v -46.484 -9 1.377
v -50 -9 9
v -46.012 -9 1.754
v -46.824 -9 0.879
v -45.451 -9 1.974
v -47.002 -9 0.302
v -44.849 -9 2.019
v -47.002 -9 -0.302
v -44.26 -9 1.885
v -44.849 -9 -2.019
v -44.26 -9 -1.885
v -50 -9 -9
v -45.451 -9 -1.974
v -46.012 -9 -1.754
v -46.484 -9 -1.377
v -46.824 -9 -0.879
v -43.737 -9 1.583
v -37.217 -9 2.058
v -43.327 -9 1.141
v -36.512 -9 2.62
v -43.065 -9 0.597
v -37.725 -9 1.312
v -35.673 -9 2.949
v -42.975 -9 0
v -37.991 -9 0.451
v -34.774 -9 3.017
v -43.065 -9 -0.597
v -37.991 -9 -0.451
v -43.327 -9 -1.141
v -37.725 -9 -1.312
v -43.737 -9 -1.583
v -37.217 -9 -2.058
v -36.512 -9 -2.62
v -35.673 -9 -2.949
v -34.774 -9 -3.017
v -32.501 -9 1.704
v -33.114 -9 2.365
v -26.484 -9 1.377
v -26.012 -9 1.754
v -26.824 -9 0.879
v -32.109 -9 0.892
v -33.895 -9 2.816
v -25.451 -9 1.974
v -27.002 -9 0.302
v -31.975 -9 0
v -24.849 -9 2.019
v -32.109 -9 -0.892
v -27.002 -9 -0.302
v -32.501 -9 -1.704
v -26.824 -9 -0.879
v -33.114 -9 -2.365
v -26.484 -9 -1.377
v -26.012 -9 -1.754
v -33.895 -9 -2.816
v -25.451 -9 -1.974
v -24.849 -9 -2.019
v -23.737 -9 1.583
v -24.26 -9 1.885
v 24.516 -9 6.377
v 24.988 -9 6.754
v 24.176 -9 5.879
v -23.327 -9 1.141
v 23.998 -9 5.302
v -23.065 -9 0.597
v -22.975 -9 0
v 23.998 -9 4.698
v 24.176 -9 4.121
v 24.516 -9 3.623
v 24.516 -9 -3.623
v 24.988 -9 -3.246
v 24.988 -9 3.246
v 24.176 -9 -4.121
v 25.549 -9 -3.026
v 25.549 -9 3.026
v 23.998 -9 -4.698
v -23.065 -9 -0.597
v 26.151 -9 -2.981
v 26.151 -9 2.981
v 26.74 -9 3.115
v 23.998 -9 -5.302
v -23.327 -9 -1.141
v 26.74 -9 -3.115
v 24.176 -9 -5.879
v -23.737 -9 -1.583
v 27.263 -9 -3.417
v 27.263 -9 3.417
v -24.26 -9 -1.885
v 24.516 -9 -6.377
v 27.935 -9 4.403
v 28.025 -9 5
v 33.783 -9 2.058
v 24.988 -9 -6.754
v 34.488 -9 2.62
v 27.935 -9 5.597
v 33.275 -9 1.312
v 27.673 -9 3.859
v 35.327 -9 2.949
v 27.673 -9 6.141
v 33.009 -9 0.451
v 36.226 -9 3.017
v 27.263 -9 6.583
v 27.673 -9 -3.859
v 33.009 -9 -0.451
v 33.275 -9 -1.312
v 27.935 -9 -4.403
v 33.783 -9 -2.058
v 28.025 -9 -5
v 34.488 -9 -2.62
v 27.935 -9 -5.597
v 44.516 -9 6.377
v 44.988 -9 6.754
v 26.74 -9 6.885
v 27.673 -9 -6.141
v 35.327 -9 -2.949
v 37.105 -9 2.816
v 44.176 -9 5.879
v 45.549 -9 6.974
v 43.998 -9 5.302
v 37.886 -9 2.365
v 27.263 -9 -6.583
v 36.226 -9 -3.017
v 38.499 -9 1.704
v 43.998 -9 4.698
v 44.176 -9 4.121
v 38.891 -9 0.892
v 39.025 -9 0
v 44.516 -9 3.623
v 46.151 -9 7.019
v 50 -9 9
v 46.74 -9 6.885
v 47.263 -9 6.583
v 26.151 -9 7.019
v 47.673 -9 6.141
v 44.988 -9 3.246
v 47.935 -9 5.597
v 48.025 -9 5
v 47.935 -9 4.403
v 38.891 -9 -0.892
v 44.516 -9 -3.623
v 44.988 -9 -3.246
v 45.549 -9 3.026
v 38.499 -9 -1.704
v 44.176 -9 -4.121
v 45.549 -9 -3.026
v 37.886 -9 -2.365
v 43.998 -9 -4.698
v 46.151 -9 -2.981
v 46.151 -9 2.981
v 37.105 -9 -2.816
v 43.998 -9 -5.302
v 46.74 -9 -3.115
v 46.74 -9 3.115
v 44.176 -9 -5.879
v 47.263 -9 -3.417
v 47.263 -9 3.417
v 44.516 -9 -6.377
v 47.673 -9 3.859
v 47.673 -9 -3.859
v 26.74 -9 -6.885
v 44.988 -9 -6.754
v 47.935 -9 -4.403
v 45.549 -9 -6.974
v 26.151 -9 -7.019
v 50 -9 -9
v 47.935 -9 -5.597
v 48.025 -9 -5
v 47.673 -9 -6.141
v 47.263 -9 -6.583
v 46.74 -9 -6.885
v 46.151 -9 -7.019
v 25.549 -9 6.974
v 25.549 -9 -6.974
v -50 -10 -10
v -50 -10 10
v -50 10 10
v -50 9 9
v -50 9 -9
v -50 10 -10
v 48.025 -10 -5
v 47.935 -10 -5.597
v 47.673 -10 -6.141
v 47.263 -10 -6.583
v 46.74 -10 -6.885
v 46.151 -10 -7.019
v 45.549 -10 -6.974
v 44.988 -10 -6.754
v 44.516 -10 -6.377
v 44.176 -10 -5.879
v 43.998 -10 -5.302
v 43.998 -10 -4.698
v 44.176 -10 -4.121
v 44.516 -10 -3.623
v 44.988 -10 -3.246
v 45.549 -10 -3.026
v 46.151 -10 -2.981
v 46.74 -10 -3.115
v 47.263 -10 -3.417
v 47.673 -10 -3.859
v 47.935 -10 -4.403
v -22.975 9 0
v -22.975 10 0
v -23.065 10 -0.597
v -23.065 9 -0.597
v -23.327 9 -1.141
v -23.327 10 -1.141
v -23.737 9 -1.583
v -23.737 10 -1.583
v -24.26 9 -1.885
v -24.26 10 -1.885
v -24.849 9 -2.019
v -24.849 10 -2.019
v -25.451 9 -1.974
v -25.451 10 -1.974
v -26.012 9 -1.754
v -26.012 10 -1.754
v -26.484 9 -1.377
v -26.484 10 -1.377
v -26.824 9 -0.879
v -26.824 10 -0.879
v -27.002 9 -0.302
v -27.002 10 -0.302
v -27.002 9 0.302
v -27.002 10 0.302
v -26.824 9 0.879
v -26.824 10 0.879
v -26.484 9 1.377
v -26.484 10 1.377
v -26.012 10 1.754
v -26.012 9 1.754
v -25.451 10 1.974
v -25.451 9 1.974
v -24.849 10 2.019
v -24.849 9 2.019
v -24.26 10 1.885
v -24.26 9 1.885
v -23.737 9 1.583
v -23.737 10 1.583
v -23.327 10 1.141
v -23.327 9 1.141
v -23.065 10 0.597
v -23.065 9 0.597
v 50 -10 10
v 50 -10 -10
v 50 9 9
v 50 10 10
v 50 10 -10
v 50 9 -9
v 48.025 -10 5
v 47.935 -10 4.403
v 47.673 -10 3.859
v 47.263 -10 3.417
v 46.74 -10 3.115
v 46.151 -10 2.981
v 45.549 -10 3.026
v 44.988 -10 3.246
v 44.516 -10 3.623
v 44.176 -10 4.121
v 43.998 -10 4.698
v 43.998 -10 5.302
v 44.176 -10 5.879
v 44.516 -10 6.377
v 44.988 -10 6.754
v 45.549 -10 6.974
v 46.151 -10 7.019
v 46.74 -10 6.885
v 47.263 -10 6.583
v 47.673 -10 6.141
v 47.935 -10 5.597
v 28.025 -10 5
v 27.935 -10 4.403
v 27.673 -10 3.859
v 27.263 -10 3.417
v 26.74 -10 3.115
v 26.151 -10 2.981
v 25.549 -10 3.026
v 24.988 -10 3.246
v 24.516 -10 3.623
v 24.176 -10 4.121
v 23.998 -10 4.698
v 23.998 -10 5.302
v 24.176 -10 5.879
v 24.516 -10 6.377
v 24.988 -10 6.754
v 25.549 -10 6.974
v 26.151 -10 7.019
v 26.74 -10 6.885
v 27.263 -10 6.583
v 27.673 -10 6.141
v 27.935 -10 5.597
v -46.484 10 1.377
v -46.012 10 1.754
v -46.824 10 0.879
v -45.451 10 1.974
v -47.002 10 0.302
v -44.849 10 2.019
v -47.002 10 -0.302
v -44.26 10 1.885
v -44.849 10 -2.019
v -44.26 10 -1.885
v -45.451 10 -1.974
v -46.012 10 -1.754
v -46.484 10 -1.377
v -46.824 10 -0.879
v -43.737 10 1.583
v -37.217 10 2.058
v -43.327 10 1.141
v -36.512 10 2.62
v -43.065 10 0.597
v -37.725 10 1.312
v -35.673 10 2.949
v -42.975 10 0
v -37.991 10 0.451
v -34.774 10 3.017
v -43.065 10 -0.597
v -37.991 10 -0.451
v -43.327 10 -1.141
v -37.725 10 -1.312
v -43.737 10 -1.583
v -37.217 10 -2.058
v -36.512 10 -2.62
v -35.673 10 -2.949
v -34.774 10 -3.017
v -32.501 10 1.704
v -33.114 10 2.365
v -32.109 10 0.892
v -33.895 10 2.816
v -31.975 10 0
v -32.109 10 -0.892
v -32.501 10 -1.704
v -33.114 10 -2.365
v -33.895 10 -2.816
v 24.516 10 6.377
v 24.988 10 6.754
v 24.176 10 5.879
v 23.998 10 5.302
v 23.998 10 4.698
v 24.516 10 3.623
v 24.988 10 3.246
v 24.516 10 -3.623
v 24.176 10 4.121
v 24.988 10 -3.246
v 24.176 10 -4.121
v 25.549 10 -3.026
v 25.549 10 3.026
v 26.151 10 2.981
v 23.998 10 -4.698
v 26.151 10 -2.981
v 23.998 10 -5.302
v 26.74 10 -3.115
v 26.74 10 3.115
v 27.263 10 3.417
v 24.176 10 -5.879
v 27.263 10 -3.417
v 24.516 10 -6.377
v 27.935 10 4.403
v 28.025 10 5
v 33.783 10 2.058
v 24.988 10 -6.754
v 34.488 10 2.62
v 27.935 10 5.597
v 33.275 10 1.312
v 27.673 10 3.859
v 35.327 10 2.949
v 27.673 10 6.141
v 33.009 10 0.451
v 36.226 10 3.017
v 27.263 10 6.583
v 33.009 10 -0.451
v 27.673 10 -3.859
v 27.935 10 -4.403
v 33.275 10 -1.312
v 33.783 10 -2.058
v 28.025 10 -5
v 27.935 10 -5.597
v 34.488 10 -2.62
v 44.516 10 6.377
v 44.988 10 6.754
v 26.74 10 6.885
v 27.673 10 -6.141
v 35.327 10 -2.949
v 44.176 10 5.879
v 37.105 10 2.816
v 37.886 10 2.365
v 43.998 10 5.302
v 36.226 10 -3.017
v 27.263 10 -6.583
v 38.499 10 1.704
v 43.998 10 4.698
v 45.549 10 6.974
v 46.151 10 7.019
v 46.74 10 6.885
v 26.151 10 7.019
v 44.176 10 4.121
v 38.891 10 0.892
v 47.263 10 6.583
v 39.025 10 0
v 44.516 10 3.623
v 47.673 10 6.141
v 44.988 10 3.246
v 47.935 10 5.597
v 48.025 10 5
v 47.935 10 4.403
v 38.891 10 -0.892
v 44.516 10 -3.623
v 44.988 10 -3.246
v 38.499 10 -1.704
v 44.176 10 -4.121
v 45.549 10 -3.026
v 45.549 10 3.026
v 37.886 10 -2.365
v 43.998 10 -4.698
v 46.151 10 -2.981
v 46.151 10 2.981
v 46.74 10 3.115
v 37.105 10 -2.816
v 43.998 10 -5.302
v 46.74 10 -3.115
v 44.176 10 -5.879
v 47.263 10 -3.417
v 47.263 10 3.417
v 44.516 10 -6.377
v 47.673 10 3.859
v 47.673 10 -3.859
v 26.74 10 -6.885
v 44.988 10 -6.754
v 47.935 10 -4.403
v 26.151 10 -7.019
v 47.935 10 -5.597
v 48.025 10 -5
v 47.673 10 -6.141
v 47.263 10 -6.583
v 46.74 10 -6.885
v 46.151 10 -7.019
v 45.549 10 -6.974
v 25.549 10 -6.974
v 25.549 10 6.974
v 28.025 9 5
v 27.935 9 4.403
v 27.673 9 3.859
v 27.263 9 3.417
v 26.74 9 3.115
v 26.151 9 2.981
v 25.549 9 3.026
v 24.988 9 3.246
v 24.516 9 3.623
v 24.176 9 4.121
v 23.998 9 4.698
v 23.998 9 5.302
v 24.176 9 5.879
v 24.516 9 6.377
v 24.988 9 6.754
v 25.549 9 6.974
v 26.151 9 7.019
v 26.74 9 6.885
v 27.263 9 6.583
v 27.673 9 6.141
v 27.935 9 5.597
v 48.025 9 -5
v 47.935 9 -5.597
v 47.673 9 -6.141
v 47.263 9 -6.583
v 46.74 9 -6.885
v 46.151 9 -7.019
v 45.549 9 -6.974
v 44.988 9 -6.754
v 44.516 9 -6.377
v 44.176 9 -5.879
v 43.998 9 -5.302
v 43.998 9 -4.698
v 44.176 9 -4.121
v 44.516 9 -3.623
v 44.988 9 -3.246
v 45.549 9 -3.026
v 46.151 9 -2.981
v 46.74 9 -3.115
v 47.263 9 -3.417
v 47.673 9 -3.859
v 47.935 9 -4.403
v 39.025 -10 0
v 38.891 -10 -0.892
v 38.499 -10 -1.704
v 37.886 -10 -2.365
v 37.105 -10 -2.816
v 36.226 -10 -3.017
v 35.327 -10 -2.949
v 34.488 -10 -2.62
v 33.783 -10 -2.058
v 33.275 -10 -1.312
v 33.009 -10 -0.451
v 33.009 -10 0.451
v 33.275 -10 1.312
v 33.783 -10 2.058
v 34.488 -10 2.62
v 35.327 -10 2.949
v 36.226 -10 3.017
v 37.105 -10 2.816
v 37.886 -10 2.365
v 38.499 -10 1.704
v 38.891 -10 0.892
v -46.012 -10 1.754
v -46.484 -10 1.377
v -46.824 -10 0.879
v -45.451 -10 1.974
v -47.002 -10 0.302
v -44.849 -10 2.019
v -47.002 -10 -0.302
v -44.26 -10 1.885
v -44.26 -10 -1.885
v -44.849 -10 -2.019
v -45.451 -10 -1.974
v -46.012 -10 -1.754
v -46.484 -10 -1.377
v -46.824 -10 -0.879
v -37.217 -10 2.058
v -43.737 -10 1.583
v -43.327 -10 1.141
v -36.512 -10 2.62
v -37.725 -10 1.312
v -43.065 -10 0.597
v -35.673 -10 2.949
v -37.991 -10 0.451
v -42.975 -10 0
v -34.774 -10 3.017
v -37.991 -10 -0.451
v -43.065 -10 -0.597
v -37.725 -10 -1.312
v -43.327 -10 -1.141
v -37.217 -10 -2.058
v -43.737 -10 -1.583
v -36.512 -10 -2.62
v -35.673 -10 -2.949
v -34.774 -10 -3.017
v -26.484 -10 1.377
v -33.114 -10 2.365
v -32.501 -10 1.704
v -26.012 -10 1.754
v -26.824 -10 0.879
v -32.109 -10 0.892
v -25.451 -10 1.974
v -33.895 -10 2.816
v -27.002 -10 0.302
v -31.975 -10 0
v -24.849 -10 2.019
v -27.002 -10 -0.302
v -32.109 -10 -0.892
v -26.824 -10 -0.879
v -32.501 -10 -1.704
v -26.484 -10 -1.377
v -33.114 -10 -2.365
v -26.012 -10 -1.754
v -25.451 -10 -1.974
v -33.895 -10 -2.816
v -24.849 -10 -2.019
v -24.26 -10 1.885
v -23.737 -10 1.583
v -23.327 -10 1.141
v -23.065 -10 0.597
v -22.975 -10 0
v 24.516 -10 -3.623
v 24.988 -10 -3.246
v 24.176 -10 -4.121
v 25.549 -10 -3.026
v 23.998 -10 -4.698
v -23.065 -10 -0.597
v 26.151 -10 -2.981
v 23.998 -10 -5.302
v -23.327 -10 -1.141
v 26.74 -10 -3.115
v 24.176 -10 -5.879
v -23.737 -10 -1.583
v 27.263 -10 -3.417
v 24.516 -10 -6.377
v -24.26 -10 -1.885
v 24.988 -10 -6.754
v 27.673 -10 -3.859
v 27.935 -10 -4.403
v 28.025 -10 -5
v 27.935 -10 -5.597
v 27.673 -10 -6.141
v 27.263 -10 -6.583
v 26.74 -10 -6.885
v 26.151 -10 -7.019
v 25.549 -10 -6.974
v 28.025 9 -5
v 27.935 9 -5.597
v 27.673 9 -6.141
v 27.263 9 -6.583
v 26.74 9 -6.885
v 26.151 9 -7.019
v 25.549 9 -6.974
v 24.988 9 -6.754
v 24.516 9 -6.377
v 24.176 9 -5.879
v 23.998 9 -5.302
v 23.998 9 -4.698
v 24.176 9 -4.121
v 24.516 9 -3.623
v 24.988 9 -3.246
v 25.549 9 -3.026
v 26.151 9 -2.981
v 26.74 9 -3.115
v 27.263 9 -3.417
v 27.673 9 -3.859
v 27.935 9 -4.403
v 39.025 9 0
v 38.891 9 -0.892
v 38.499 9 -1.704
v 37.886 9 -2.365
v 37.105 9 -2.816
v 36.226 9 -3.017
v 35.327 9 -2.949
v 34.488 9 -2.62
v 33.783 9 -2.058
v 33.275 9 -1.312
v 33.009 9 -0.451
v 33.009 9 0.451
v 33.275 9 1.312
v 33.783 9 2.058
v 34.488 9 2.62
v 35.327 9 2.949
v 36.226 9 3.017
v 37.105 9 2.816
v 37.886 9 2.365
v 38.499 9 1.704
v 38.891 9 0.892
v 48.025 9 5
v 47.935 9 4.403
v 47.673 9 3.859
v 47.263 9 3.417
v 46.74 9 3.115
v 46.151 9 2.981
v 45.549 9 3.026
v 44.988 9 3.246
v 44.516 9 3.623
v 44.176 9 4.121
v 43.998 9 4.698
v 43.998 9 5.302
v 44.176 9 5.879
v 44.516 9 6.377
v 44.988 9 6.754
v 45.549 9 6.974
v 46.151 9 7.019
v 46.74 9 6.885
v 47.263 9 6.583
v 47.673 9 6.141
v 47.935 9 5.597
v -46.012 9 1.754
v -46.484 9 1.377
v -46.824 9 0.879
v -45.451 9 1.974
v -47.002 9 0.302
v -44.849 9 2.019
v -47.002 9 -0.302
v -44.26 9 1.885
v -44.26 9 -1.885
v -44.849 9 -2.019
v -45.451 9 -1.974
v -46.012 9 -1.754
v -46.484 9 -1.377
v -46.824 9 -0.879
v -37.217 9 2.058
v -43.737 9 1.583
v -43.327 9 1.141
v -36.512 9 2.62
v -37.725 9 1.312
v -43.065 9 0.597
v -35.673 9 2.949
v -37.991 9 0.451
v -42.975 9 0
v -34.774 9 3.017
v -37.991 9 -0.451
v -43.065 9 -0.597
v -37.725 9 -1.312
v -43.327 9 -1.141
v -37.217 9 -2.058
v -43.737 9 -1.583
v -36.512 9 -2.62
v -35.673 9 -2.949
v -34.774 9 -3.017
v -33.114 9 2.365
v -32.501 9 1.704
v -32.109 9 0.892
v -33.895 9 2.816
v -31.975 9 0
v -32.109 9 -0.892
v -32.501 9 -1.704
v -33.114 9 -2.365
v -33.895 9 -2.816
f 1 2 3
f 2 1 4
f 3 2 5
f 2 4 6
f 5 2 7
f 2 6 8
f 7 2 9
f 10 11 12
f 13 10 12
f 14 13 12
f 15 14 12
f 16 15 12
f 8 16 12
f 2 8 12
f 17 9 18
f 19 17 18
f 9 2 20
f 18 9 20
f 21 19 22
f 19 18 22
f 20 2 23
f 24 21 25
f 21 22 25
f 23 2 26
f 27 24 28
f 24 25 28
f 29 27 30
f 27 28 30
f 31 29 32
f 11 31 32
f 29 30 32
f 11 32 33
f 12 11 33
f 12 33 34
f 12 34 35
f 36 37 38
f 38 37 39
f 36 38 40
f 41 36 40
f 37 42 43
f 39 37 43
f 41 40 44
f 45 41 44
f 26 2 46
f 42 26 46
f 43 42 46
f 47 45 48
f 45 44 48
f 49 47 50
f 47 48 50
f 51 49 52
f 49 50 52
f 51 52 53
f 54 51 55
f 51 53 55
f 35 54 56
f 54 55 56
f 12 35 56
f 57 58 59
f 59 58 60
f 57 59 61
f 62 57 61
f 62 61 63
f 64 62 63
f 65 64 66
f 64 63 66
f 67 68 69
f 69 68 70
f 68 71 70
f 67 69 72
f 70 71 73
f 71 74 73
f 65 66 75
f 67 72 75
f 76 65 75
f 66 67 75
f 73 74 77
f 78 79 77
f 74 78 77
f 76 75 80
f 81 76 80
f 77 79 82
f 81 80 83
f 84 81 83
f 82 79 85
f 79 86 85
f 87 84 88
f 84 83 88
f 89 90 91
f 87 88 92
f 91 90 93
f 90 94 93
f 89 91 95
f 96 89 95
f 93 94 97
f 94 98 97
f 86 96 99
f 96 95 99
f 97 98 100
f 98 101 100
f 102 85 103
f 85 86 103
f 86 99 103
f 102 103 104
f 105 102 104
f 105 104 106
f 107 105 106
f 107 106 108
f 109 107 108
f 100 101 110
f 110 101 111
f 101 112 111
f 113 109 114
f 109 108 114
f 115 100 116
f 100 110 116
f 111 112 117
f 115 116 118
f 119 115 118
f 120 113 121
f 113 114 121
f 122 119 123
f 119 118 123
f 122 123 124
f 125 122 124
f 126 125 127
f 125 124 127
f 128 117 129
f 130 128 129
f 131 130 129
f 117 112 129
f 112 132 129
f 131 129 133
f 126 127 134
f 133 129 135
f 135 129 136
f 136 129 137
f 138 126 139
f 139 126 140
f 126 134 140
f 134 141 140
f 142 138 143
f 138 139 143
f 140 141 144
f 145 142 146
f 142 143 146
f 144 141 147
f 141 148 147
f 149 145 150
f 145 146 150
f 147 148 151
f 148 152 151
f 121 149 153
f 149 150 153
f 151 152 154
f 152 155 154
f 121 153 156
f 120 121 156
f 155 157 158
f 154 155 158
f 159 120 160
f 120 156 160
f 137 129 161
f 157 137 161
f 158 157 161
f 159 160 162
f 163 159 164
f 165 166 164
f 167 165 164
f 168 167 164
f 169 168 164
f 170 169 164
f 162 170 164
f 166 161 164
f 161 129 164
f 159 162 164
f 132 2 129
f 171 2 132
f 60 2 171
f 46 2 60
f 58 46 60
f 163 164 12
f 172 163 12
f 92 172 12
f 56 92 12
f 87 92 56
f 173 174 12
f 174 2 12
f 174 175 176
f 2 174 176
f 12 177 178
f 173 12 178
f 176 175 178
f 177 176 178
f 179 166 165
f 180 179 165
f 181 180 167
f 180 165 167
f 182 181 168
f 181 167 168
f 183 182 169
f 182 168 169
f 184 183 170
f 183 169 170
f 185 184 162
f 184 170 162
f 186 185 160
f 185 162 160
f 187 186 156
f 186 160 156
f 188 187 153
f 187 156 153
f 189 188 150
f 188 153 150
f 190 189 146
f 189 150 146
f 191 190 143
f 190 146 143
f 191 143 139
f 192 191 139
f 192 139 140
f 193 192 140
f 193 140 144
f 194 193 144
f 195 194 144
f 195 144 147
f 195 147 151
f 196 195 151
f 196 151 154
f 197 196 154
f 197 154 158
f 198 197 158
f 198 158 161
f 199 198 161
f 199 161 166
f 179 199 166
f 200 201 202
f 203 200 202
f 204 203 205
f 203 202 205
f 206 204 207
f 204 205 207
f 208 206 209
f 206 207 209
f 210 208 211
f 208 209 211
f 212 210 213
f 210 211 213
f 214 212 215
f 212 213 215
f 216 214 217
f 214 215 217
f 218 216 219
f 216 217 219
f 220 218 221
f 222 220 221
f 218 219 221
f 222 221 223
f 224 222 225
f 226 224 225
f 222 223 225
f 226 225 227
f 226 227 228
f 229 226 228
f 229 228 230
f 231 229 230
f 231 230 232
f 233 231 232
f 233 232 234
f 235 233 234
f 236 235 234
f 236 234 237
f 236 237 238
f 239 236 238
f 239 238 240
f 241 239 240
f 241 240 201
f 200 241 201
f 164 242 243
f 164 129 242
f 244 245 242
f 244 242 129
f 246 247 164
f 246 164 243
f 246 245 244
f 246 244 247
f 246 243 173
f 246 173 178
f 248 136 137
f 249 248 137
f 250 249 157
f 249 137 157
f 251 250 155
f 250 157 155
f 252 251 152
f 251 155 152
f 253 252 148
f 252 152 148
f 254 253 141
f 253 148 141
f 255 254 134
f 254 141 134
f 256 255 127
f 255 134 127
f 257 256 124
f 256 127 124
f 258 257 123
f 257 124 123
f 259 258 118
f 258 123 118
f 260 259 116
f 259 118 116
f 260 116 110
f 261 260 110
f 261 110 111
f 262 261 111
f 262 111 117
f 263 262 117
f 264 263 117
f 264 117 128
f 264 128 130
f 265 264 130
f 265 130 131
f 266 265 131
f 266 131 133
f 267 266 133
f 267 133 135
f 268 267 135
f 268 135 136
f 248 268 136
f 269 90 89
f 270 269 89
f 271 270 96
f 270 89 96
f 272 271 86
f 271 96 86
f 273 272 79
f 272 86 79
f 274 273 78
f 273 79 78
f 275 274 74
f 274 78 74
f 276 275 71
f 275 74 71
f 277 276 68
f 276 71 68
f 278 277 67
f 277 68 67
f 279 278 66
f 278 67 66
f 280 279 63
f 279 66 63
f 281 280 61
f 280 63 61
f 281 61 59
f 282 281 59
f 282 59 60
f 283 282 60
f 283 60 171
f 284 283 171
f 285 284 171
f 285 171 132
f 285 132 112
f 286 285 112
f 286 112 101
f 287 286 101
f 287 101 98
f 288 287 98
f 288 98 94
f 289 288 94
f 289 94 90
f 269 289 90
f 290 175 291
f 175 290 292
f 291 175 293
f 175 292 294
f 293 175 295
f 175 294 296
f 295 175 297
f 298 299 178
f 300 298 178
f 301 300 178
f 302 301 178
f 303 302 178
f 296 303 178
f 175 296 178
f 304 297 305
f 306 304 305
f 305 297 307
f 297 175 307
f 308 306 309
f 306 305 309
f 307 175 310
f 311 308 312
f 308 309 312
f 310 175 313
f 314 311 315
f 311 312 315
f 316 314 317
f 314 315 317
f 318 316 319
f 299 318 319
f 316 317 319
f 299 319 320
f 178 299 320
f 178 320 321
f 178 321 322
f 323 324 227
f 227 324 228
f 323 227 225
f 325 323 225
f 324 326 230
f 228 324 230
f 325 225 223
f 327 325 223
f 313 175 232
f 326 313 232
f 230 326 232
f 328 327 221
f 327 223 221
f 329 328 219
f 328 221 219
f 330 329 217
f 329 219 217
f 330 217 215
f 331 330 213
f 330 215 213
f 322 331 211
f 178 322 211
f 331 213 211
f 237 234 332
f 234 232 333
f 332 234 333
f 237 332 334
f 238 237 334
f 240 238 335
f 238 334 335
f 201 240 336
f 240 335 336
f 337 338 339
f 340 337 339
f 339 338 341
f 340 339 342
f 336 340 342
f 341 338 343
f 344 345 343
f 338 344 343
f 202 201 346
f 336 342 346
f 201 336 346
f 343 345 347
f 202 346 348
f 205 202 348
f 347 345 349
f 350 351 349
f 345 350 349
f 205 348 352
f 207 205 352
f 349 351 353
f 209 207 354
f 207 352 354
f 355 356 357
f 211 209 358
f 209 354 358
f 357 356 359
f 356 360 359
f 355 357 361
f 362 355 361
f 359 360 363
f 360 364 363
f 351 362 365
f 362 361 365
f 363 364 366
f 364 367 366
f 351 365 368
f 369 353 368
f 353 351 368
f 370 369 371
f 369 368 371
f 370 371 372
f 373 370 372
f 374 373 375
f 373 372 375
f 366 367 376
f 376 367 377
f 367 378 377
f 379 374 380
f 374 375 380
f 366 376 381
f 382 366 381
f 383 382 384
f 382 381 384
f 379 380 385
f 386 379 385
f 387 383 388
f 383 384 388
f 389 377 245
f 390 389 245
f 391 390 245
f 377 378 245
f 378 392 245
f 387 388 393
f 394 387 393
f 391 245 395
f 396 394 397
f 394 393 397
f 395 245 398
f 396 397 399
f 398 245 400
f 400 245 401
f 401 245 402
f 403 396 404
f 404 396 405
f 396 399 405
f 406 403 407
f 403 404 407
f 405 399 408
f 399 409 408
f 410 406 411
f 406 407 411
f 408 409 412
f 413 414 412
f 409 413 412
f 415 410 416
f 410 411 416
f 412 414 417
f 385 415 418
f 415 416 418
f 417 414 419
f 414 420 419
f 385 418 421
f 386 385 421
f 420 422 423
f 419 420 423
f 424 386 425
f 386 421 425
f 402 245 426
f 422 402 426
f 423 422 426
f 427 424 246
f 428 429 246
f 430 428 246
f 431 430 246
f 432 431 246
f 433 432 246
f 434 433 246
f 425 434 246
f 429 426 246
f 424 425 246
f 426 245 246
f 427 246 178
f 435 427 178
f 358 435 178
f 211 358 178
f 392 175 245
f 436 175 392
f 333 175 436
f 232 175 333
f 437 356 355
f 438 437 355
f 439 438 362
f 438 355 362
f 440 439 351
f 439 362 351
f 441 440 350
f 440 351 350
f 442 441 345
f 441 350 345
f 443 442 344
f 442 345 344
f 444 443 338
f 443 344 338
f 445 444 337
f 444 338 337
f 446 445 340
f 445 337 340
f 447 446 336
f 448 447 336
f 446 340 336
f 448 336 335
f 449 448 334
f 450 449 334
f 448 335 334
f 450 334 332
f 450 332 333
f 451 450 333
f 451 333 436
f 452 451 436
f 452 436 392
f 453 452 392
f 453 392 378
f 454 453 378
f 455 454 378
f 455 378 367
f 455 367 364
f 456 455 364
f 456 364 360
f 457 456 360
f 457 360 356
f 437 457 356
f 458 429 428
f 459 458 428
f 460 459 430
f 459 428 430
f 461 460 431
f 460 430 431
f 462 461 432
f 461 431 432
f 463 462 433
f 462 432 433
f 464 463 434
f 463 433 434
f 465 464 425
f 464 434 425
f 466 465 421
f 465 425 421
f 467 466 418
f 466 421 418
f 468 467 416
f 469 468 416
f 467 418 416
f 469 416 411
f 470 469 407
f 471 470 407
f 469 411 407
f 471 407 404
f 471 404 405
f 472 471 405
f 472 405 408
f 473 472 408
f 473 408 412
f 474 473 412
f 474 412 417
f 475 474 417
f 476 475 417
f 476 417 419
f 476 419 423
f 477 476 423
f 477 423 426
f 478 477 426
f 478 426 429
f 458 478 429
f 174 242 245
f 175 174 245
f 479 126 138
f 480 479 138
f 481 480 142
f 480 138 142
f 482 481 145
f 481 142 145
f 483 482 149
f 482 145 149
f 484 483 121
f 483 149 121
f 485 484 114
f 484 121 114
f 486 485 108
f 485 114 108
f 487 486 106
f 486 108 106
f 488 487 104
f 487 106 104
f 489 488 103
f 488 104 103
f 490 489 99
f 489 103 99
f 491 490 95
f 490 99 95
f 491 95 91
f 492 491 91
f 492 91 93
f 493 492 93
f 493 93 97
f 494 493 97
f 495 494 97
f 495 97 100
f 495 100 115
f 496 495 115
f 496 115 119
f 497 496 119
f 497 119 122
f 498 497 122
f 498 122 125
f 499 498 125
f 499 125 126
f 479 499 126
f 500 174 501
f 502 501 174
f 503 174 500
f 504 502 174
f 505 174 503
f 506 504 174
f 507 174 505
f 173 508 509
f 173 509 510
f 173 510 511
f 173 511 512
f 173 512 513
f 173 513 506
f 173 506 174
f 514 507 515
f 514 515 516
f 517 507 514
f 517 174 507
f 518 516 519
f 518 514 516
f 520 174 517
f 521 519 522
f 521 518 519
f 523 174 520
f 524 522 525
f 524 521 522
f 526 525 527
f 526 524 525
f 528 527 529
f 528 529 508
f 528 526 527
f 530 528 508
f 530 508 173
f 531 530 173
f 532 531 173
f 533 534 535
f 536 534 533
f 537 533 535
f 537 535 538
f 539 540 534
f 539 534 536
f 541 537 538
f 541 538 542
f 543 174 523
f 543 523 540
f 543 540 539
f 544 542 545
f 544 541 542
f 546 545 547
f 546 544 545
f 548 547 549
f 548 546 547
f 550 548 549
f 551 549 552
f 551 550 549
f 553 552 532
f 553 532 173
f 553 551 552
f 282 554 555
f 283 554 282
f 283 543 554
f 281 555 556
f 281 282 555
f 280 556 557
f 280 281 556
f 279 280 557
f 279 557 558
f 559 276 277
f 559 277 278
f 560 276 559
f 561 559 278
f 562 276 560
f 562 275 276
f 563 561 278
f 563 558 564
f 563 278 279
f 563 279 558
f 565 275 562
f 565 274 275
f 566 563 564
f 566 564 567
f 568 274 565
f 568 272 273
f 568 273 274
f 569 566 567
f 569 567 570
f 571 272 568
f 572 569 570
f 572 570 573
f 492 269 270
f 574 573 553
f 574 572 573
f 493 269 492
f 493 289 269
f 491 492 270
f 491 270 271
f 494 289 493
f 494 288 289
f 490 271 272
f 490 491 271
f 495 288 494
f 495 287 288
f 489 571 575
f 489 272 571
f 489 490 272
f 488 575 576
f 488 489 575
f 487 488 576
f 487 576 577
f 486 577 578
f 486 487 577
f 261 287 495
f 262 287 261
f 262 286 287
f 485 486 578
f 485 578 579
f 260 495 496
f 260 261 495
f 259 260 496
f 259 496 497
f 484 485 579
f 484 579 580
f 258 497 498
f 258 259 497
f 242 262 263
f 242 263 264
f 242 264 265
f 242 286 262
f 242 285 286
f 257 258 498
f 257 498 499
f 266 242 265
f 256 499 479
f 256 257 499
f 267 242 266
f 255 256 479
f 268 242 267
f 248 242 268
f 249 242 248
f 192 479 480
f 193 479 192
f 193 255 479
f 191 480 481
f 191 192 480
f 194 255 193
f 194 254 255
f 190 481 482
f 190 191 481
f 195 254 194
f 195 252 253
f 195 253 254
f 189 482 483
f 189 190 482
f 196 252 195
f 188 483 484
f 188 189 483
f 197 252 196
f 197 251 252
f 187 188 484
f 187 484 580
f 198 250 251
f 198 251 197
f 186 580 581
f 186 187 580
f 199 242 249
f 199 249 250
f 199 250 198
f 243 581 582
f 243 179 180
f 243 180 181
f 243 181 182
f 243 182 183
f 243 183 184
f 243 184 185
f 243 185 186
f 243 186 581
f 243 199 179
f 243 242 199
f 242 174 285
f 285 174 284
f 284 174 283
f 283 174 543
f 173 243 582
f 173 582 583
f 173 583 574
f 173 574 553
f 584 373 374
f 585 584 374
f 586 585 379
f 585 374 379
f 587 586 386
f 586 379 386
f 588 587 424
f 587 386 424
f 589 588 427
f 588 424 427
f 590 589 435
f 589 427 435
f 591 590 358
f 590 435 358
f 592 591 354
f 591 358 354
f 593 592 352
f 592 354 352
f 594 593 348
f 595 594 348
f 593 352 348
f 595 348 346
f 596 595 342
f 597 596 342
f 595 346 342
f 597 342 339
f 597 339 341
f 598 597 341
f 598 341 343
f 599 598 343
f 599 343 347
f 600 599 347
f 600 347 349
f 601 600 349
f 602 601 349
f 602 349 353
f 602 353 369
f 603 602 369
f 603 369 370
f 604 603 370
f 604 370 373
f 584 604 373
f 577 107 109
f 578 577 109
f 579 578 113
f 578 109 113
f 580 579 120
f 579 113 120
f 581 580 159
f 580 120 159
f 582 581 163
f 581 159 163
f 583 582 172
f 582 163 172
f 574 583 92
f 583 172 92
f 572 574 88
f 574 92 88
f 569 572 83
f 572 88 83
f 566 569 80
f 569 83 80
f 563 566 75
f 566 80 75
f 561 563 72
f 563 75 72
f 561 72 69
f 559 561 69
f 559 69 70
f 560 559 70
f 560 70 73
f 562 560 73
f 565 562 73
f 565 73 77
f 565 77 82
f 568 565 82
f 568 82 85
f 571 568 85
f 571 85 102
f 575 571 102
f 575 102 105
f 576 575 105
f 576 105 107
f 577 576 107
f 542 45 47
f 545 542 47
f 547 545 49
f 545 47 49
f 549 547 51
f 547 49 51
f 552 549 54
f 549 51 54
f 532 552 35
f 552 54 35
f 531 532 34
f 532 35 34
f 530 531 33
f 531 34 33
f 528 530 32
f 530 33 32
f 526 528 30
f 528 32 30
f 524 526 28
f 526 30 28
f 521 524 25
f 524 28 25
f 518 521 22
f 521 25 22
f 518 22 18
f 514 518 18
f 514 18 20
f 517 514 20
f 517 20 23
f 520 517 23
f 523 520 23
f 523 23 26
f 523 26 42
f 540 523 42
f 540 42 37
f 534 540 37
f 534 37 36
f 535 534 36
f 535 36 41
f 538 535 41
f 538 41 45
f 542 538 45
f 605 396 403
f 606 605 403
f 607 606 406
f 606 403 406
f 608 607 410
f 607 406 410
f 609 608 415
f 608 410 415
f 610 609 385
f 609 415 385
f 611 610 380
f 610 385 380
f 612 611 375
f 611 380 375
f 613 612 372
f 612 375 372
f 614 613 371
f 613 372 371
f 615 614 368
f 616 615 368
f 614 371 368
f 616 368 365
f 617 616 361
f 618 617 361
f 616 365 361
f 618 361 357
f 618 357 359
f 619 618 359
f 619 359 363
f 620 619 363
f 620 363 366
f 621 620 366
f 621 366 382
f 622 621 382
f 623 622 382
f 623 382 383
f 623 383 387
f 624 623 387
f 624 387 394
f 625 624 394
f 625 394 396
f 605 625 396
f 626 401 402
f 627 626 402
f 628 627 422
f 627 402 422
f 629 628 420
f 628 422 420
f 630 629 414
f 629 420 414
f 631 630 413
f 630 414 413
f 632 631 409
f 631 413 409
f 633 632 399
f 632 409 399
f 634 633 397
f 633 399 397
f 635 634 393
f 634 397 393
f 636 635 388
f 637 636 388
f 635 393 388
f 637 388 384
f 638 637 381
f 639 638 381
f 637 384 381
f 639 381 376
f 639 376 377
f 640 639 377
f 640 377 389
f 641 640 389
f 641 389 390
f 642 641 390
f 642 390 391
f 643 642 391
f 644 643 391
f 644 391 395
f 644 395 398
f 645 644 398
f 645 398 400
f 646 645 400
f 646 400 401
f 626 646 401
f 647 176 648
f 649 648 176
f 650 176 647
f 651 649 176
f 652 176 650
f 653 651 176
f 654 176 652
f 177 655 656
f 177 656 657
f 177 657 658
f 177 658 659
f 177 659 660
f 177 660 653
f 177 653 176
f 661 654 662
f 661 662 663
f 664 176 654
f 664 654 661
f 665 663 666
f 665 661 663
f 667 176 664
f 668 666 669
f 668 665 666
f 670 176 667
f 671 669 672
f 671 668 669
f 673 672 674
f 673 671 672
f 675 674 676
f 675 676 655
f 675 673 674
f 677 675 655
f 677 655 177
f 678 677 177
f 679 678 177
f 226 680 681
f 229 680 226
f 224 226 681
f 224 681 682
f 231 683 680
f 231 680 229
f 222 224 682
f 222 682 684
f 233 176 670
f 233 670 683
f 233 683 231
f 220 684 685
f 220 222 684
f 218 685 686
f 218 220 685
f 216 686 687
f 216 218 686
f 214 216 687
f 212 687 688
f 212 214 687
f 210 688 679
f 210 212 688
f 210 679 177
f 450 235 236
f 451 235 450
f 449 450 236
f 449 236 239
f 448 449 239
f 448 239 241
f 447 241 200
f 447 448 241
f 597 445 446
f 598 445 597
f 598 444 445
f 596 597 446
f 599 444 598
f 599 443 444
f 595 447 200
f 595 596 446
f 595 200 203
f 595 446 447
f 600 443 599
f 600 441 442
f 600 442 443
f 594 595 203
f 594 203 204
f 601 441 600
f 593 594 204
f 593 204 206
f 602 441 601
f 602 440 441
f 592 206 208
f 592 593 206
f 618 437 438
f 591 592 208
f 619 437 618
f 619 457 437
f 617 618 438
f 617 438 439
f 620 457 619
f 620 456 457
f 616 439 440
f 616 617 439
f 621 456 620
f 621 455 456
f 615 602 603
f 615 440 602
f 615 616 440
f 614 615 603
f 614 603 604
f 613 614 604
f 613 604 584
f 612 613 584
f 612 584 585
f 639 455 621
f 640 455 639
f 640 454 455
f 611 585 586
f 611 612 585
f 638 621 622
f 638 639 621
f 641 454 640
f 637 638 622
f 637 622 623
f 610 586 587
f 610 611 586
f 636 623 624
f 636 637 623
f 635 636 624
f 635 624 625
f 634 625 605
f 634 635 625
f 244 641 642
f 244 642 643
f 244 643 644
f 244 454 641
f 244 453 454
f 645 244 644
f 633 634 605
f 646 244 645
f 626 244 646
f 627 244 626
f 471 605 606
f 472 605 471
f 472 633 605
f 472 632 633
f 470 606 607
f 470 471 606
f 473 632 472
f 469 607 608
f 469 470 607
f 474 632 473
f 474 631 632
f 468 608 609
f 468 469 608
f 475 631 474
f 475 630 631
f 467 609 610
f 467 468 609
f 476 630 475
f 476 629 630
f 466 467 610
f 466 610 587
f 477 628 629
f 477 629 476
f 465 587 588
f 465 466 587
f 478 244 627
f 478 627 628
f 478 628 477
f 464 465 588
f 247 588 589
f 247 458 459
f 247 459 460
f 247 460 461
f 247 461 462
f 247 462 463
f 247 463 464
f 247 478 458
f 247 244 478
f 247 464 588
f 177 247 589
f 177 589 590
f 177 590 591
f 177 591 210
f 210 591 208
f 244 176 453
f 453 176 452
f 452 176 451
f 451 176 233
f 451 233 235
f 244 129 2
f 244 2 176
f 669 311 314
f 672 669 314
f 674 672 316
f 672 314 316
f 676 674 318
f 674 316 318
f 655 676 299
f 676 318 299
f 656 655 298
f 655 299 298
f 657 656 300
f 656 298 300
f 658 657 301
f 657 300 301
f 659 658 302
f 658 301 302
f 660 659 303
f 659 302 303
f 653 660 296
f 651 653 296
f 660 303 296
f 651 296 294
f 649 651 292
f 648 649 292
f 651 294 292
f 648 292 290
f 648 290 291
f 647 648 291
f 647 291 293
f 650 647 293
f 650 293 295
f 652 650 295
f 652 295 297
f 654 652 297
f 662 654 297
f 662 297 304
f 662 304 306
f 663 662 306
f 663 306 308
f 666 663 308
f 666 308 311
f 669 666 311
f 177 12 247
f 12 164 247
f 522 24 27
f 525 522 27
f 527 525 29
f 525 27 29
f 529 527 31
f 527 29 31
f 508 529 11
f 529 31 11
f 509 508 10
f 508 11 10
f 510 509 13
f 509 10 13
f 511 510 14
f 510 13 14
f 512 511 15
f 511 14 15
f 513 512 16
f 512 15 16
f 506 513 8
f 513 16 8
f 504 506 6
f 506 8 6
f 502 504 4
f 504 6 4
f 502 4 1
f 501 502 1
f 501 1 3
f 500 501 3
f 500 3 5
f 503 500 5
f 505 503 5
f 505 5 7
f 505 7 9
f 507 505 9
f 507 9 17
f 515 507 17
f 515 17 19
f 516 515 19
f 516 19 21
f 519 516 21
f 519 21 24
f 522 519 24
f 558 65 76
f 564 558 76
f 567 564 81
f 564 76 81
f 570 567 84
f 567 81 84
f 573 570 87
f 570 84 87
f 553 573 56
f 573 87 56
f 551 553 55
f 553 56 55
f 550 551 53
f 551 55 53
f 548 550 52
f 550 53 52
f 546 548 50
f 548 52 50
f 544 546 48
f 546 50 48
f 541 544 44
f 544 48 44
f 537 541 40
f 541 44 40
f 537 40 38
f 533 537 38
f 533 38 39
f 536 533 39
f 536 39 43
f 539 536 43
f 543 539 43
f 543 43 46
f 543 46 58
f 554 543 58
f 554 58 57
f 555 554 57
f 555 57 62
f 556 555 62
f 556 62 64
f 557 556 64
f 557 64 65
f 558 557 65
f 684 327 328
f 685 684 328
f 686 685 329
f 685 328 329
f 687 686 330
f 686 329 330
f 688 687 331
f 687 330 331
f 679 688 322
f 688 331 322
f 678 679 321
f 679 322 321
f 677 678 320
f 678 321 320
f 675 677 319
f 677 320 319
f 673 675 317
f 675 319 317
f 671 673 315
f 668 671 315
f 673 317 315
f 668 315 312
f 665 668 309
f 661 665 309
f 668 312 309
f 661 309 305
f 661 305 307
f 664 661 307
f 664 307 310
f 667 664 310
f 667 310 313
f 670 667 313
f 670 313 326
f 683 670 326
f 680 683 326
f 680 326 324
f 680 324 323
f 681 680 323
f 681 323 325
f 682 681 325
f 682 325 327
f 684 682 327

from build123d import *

# Parameters (mm, degrees)
SKETCH_1_W          = 20
SKETCH_1_H          = 20
SKETCH_1_W_2        = 18
SKETCH_1_H_2        = 18
EXTRUDE_1_DEPTH     = 50
SKETCH_2_R          = 2.025
SKETCH_2_R_2        = 3.025
CUT_EXTRUDE_1_DEPTH = 40


with BuildPart() as part:
    # 草图1 → 凸台-拉伸1 (new body, symmetric)
    with BuildSketch(Plane(origin=(0, 0, 0), x_dir=(0, 0, -1), z_dir=(1, 0, 0))):
        Rectangle(SKETCH_1_W, SKETCH_1_H)
        Rectangle(SKETCH_1_W_2, SKETCH_1_H_2, mode=Mode.SUBTRACT)
    extrude(amount=EXTRUDE_1_DEPTH, both=True)

    # 草图2 → 切除-拉伸1 (cut)
    with BuildSketch(Plane(origin=(0, 10, 0), x_dir=(1, 0, 0), z_dir=(0, 1, 0))):
        with Locations((26, 5)):
            Circle(SKETCH_2_R)
        with Locations((46, 5)):
            Circle(SKETCH_2_R)
        with Locations((46, -5)):
            Circle(SKETCH_2_R)
        with Locations((26, -5)):
            Circle(SKETCH_2_R)
        with Locations((36, 0)):
            Circle(SKETCH_2_R_2)
        with Locations((-45, 0)):
            Circle(SKETCH_2_R)
        with Locations((-25, 0)):
            Circle(SKETCH_2_R)
        with Locations((-35, 0)):
            Circle(SKETCH_2_R_2)
    extrude(amount=-CUT_EXTRUDE_1_DEPTH, mode=Mode.SUBTRACT)


solid = part.part
